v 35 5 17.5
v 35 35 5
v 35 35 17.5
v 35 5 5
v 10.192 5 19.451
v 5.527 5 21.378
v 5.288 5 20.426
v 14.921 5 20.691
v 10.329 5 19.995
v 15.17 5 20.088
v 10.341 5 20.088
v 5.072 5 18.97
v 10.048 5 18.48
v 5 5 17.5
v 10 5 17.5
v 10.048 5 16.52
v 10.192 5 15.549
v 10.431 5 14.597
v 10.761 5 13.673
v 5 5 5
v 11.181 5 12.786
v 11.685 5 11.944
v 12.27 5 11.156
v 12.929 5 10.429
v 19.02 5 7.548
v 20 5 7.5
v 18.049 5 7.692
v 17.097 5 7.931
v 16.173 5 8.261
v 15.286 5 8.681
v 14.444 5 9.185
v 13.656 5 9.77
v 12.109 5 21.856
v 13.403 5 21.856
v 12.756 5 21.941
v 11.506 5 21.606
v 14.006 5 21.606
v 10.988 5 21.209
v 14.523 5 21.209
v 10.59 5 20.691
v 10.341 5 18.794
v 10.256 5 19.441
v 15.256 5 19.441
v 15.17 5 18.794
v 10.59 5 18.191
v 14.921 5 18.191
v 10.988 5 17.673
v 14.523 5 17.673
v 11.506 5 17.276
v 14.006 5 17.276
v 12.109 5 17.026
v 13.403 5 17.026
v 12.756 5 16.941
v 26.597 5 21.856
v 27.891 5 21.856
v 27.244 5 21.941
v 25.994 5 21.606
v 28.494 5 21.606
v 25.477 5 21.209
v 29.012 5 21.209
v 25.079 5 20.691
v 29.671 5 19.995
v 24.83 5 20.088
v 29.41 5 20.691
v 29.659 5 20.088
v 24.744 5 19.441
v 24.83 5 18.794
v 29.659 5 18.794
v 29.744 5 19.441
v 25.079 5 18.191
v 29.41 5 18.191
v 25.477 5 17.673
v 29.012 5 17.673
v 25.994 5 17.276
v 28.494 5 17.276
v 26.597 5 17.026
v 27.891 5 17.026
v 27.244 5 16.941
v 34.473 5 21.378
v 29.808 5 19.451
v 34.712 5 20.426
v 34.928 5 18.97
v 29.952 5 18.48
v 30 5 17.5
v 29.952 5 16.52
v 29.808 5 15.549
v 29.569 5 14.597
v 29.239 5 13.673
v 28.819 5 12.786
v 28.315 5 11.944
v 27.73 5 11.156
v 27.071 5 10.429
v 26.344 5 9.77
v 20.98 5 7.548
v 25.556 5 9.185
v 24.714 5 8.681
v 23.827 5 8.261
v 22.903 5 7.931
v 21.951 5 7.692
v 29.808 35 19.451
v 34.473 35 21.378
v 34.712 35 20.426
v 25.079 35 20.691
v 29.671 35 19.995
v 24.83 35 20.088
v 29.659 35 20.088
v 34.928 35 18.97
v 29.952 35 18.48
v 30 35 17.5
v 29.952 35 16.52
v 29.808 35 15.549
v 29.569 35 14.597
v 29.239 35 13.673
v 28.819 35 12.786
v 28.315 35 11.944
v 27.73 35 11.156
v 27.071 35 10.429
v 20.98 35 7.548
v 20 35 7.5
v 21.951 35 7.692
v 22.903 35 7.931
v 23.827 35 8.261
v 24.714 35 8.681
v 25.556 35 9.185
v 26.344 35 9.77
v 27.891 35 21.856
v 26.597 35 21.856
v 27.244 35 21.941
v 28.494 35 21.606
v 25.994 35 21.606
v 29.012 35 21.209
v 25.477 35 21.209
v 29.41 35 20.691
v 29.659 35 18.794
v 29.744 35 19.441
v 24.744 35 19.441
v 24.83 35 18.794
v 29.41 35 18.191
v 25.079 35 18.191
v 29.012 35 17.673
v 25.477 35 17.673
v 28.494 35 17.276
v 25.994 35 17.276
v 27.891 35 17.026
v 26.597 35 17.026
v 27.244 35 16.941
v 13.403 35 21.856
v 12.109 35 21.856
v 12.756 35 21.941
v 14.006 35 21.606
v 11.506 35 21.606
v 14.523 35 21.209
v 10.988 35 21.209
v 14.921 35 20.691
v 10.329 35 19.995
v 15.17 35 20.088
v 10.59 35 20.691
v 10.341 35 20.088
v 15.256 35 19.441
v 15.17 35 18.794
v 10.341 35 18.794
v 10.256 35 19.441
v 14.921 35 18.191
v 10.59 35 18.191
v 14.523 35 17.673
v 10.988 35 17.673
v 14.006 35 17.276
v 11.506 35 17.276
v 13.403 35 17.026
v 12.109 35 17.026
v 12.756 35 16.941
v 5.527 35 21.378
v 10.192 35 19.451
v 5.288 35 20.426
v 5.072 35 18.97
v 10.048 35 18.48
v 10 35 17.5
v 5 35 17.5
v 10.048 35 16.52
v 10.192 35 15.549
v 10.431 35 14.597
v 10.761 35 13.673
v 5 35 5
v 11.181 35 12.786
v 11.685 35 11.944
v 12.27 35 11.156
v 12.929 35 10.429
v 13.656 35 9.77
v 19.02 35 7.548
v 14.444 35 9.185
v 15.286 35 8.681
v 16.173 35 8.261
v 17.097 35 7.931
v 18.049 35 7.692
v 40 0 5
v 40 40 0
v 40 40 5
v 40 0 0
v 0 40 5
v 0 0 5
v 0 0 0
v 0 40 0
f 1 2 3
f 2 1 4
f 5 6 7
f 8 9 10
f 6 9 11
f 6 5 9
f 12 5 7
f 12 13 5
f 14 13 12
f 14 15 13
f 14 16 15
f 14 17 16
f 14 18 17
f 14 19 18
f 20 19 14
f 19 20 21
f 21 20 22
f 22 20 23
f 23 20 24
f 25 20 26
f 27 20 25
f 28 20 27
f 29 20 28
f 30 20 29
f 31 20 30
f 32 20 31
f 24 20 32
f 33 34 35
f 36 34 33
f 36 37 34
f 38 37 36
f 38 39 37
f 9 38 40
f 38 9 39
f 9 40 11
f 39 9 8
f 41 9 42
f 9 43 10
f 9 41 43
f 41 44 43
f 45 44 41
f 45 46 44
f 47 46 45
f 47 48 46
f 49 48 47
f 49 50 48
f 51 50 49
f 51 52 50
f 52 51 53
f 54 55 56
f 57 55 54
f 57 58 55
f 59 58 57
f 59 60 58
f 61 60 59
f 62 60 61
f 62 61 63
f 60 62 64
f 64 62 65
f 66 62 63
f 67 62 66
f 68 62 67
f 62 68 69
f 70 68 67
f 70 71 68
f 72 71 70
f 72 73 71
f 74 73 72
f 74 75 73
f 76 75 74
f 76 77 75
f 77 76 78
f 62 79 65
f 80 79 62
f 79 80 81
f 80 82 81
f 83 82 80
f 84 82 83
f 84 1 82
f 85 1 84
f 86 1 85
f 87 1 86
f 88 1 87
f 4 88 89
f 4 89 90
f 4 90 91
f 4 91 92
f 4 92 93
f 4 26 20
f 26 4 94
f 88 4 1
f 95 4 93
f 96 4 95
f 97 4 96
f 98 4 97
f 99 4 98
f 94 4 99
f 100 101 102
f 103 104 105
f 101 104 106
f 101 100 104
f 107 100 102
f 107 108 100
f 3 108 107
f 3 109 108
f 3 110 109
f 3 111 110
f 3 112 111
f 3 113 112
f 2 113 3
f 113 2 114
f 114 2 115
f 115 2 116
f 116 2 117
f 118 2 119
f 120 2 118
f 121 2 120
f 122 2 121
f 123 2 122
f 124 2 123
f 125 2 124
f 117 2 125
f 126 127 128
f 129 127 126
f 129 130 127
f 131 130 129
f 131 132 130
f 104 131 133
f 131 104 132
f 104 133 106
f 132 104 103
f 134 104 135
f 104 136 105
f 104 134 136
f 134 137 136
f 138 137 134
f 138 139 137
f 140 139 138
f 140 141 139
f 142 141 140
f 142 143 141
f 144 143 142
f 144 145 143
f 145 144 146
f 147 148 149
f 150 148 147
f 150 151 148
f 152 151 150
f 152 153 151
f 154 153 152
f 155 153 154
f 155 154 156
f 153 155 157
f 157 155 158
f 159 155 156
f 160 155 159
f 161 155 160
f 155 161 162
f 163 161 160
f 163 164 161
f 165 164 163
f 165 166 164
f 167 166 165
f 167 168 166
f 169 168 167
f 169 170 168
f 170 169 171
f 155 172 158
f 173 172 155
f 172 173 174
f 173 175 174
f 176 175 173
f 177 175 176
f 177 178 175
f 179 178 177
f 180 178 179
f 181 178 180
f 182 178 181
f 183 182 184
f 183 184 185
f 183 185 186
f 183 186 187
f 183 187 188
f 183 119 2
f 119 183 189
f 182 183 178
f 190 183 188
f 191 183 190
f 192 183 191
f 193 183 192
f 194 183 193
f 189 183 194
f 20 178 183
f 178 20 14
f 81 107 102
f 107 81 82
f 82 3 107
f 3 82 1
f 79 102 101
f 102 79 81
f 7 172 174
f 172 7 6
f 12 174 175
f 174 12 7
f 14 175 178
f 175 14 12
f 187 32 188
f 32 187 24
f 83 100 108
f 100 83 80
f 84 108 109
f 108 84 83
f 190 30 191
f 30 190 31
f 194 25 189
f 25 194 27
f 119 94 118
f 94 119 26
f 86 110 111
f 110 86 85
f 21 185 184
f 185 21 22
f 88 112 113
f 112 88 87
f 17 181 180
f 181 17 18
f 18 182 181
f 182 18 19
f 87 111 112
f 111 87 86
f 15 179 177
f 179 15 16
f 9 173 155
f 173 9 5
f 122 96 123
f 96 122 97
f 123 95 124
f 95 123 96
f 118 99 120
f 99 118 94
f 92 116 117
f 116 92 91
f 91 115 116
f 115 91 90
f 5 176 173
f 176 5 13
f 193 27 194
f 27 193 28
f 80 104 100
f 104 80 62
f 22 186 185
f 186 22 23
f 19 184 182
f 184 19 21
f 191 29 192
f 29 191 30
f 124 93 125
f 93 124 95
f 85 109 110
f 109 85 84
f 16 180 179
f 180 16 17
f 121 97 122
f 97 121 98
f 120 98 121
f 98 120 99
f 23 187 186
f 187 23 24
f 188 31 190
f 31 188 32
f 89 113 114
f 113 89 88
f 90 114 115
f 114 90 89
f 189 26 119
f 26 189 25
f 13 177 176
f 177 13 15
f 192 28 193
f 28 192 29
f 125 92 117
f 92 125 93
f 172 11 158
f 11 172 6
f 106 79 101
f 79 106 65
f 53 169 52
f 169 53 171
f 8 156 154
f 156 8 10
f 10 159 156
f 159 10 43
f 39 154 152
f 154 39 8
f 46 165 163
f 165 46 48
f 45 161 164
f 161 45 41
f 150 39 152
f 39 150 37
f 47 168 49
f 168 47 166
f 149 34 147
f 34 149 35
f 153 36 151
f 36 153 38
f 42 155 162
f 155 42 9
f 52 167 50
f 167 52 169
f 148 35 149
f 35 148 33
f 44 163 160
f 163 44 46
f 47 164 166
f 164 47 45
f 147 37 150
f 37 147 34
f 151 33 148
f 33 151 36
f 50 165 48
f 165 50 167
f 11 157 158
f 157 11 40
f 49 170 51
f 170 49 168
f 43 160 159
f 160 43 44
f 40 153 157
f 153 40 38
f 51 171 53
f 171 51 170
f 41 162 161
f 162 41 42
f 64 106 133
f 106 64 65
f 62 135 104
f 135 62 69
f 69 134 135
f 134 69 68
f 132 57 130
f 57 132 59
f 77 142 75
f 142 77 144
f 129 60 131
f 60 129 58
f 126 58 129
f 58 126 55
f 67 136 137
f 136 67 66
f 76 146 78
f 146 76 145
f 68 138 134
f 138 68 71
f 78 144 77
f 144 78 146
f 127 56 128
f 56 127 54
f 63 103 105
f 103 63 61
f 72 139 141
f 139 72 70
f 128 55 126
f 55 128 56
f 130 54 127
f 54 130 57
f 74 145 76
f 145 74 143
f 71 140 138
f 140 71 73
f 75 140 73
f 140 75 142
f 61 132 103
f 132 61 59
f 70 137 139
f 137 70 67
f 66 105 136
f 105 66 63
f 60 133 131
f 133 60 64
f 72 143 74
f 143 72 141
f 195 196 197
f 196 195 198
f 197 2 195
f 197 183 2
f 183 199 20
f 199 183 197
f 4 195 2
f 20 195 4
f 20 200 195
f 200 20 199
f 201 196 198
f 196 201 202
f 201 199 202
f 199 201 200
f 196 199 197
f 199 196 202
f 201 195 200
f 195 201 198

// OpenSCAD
// Generated by SolidPython 1.1.3 on 2025-06-22 17:41:13
$fn = 64;


union() {
	cube(size = [40, 40, 5]);
	translate(v = [0, 0, 17.5000000000]) {
		translate(v = [20.0000000000, 35.0000000000, 0]) {
			rotate(a = [90, 0, 0]) {
				union() {
					difference() {
						union() {
							translate(v = [-15, -15, 0]) {
								cube(size = [30, 15.0000000000, 30]);
							}
							cylinder(h = 30, r = 15.0000000000);
						}
						translate(v = [0, 0, -0.1000000000]) {
							cylinder(h = 30.2000000000, r = 10);
						}
						translate(v = [0, 0, -0.1000000000]) {
							linear_extrude(height = 30.2000000000) {
								polygon(points = [[0, 0], [96.59258262890683, 25.881904510252074], [-96.59258262890683, 25.881904510252102], [0, 0]]);
							}
						}
					}
					union() {
						translate(v = [-7.244443697168012, 1.9411428382689075, 0]) {
							cylinder($fn = 24, h = 30, r = 2.5000000000);
						}
						translate(v = [7.244443697168012, 1.9411428382689075, 0]) {
							cylinder($fn = 24, h = 30, r = 2.5000000000);
						}
					}
				}
			}
		}
	}
}
/***********************************************
*********      SolidPython code:      **********
************************************************
 
import numpy as np
from solid import *
from solid.utils import *
import os

folder = os.path.basename(os.path.dirname(__file__))

z = 0.1
z2 = 0.2
m = 2

t = translate
tx = lambda e, x: t([x, 0, 0])(e)
ty = lambda e, x: t([0, x, 0])(e)
tz = lambda e, x: t([0, 0, x])(e)
txy = lambda e, x, y: t([x, y, 0])(e)

r = rotate
rx = lambda e, x: r([x, 0, 0])(e)
ry = lambda e, x: r([0, x, 0])(e)
rz = lambda e, x: r([0, 0, x])(e)

sc = lambda e, x: scale([x, x, x])(e)
sx = lambda e, x: scale([x, 1, 1])(e)
sy = lambda e, x: scale([1, x, 1])(e)
sxy = lambda e, x: scale([x, x, 1])(e)
sz = lambda e, x: scale([1, 1, x])(e)

cos = np.cos
sin = np.sin
pi = np.pi
save = lambda m, n: scad_render_to_file(m, n, file_header="$fn = 64;")


# Parameters
w_fan = 140 + m  # Width of fan
h_fan = 140 + m  # Height of fan
d_fan = 24 + m  # Depth of fan
r_fan = 134 / 2  # Radius
ox_fan_hole = 7 + m  # Offset x of fan screw hole
oy_fan_hole = 7 + m  # Offset y of fan screw hole
r_fan_hole = 2.5  # Radius of fan screw hole
re_fan_hole = 13  # Extra radius of fan screw hole
d_fan_hole = 5  # Depth of fan screw hole

x_ihose = 0.15 * w_fan  # Offset x of hose input connector
y_ihose = 0.50 * h_fan  # Offset y of hose input connector
x_ohose = 0.25 * w_fan  # Offset x of hose output connector
y_ohose = 0.40 * w_fan / 2  # Offset y of hose output connector
r_hose = 13  # Radius of hose connector
m_hose = 3  # Margin of hose connector
d_hose = 30  # Depth of hose connector

h_adapter = 2  # Height of adapter
w_adapter = 120  # Width of adapter attachment
d_adapter = 3  # Depth of adapter attachment
wd_adapter = 3  # Wall depth of adapter attachment

w_wall_mount = (r_hose - m_hose) * 2 + 5 * 4  # Width of wall mount
h_wall_mount = w_wall_mount  # Height of wall mount


def create_fan_box():
    d = w_fan / 2 - d_fan / 2
    fan_box = cube([w_fan, h_fan, d])
    fan = sphere(r=r_fan)
    fan = txy(fan, w_fan / 2, h_fan / 2)
    fan = tz(fan, -d_fan / 2)

    hole = cylinder(r=re_fan_hole, h=d + z2)
    hole = tz(hole, d_fan_hole)
    hole += cylinder(r=r_fan_hole, h=d + z2)
    ox, oy = ox_fan_hole, oy_fan_hole
    holes = txy(hole, ox, oy)
    holes += txy(hole, w_fan - ox, oy)
    holes += txy(hole, ox, h_fan - oy)
    holes += txy(hole, w_fan - ox, h_fan - oy)
    holes = tz(holes, -z)

    return fan_box - fan - holes


def create_fan_box_input():
    fan_box = create_fan_box()

    d = w_fan / 2 - d_fan / 2
    hose_input = cylinder(r=r_hose, h=d_hose)
    hose_input = txy(hose_input, x_ihose, y_ihose)
    hose_input = tz(hose_input, d)
    hose_input_hole = cylinder(r=r_hose - m_hose, h=d + d_hose + z2)
    hose_input_hole = txy(hose_input_hole, x_ihose, y_ihose)
    hose_input_hole = tz(hose_input_hole, -z)

    return fan_box + hose_input - hose_input_hole


def create_fan_box_output():
    fan_box = create_fan_box()

    d = w_fan / 2 - d_fan / 2
    hose_output = cylinder(r=r_hose, h=d_hose)
    hose_output = rx(hose_output, 90)
    hose_output = tx(hose_output, x_ohose)
    hose_output = tz(hose_output, y_ohose)
    hose_output_hole = cylinder(r=r_hose - m_hose, h=h_fan + d_hose + z2)
    hose_output_hole = rx(hose_output_hole, 90)
    hose_output_hole = txy(hose_output_hole, x_ohose, h_fan / 2)
    hose_output_hole = tz(hose_output_hole, y_ohose)

    return fan_box + hose_output - hose_output_hole


def create_litter_box_input_clamps():
    m = 6  # Margin

    clamp_hole = cube([m + z, m_hose + d_adapter + wd_adapter, h_adapter + z2])
    clamp_hole = txy(clamp_hole, -m - z, m)
    clamp_hole = tz(clamp_hole, -z)

    input_clamp = cube([m * 2.5, m_hose + d_adapter + wd_adapter + m * 2, h_adapter])
    input_clamp = tx(input_clamp, -m)
    input_clamp -= clamp_hole
    input_clamp = ty(input_clamp, -m_hose - wd_adapter)

    input_clamps = input_clamp + tz(tx(ry(input_clamp, 180), m * 4), h_adapter)

    return input_clamps


def create_litter_box_hose_input():
    m = 5  # Margin

    # The input hole for the air flow
    airflow_hole = cube(
        [w_adapter, d_adapter + wd_adapter + m * 3 + z2, h_adapter + z2]
    )
    airflow_hole = ty(airflow_hole, -m - z)
    airflow_hole = tz(airflow_hole, -z)

    # Shape of the rounded cat litter box
    r = 1000  # Radius of cat litter box
    indent = 2  # Indent of the cat litter box
    litter_box_shape = cylinder(r=r, h=r_hose * 2, segments=512 * r / 1000)
    litter_box_shape = txy(litter_box_shape, w_adapter / 2, r - indent)
    litter_box_shape = tz(litter_box_shape, -r_hose)

    # Hose input connector
    l_hose = w_adapter + m * 2 + d_hose
    hose_input = cylinder(r=r_hose, h=l_hose)
    hose_input += sphere(r=r_hose) - sphere(r=r_hose - m_hose)
    hose_input -= tz(cylinder(r=r_hose - m_hose, h=l_hose + z2), -z)
    hose_input = ry(hose_input, 90)
    hose_input = tz(hose_input, h_adapter / 2)
    hose_input = txy(hose_input, -m * 2, -r_hose)
    hose_input -= litter_box_shape
    hose_input -= airflow_hole
    hose_input = rx(hose_input, 90)
    hose_input = tz(hose_input, r_hose * 2)

    return hose_input


def get_pos_from_angle(angle, radius, offset_angle=0):
    """
    Get the x, y position from an angle and radius.
    :param angle: Angle in degrees.
    :param radius: Radius of the circle.
    :return: Tuple of (x, y) position.
    """
    angle_rad = np.deg2rad(angle + offset_angle)
    x = radius * cos(angle_rad)
    y = radius * sin(angle_rad)
    return x, y


def create_cake_slice(radius, angle_start, angle_end, height, offset_angle=0):
    """
    Create a cake slice shape from a circle.
    :param radius: Radius of the circle.
    :param angle_start: Start angle in degrees.
    :param angle_end: End angle in degrees.
    :param height: Height of the cake slice.
    :return: Cake slice shape.
    """
    x_start, y_start = get_pos_from_angle(angle_start, radius, offset_angle)
    x_end, y_end = get_pos_from_angle(angle_end, radius, offset_angle)

    points = [[0, 0], [x_start, y_start], [x_end, y_end], [0, 0]]

    return linear_extrude(height)(polygon(points))


def create_hose_wall_mount():
    m = 5  # Margin
    hd = h_wall_mount - m * 2  # Hose depth
    r = r_hose - m_hose  # Radius of the hose
    ro = r + m  # Outer radius of the hose

    # The wall mount for the hose
    wall_mount = cube([w_wall_mount, h_wall_mount, m])

    # The hose input connector
    w = ro * 2
    hose_input = cube([w, w / 2, hd])
    hose_input = txy(hose_input, -r - m, -r - m)
    hose_input += cylinder(r=w / 2, h=hd)
    hose_input -= tz(cylinder(r=r, h=hd + z2), -z)

    deg = 75  # Angle of the cake slice
    cake_slice = create_cake_slice(
        radius=100,
        angle_start=-deg,
        angle_end=deg,
        height=hd + z2,
        offset_angle=90,
    )
    cake_slice = tz(cake_slice, -z)
    hose_input -= cake_slice

    rounded_corner = cylinder(r=m / 2, h=hd, segments=24)
    x1, y1 = get_pos_from_angle(deg, ro / 2, offset_angle=90)
    rounded_corners = txy(rounded_corner, x1, y1) + txy(rounded_corner, -x1, y1)
    hose_input += rounded_corners

    hose_input = rx(hose_input, 90)
    hose_input = txy(hose_input, w_wall_mount / 2, h_wall_mount / 2 + hd / 2)
    hose_input = tz(hose_input, ro + m / 2)

    return wall_mount + hose_input


def create_hose_corner_mount(deg=0, fill_corner=False, round_edge=False):
    m = 5  # Margin
    r = r_hose - m_hose  # Radius of the hose
    ro = r + m  # Outer radius of the hose
    length = d_hose

    outer_shape = rz(
        circle(r=ro) + txy(square([ro, ro * 2]), -r - m, -r - m),
        deg,
    )

    inner_shape = rz(
        circle(r=r),
        deg,
    )

    bend_shell = rotate_extrude(angle=90)(tx(outer_shape, ro))
    bend_hole = rotate_extrude(angle=90)(tx(inner_shape, ro))
    bend = bend_shell - bend_hole

    outer_edge = linear_extrude(height=length)(outer_shape)
    inner_edge = linear_extrude(height=length + z2)(inner_shape)

    edge_a_shell = rx(outer_edge, 90)
    edge_a_shell = tx(edge_a_shell, ro)

    edge_a_hole = rx(inner_edge, 90)
    edge_a_hole = tx(edge_a_hole, ro)
    edge_a_hole = ty(edge_a_hole, z)

    edge_b_shell = outer_edge
    edge_b_shell = sy(edge_b_shell, -1)
    edge_b_shell = rz(edge_b_shell, 90)
    edge_b_shell = ry(edge_b_shell, -90)
    edge_b_shell = ty(edge_b_shell, ro)

    edge_b_hole = inner_edge
    edge_b_hole = sy(edge_b_hole, -1)
    edge_b_hole = rz(edge_b_hole, 90)
    edge_b_hole = ry(edge_b_hole, -90)
    edge_b_hole = ty(edge_b_hole, ro)
    edge_b_hole = tx(edge_b_hole, z)

    if fill_corner:
        corner_fill = cube([ro * 2, ro * 2, ro * 2])
        corner_fill -= tz(txy(cube([ro, ro, ro * 2 + z2]), -z, -z), -z)
        corner_fill = tz(corner_fill, -r - m)
        bend += corner_fill

        if not round_edge:
            round_corner = cube([m + z, m + z, ro * 2 + z2])
            round_corner -= cylinder(r=m, h=ro * 2 + z2)
            round_corner = tz(round_corner, -r - m - z)
            round_corner = txy(round_corner, ro * 2 - m, ro * 2 - m)
            bend -= round_corner

    if round_edge:
        round_edge_hole = cube([ro * 2 + length + z2, ro + z, ro * 2 + z2])
        round_edge_hole = tz(round_edge_hole, -r - m - z)
        round_edge_hole -= ry(cylinder(r=ro, h=ro * 2 + length + z2), 90)
        round_edge_hole = tx(round_edge_hole, -length - z)
        round_edge_hole = ty(round_edge_hole, ro)
        bend -= round_edge_hole
        edge_b_shell -= round_edge_hole

    shell = bend + edge_a_shell + edge_b_shell
    hole = bend_hole + edge_a_hole + edge_b_hole

    return shell - hole


def create_hose_inner_corner_mount():
    return create_hose_corner_mount(deg=180, fill_corner=True)


def create_hose_outer_corner_mount():
    return create_hose_corner_mount(deg=0)


def create_hose_outward_corner_mount():
    return create_hose_corner_mount(deg=180, fill_corner=True, round_edge=True)


def create_hose_side_corner_mount():
    return create_hose_corner_mount(deg=90)


# Create the fan box input and output, and the assembly
fan_box_input = create_fan_box_input()
fan_box_output = create_fan_box_output()
assembly = rx(fan_box_input, 90) + ty(tz(rx(fan_box_output, -90), h_fan), d_fan)
save(fan_box_input, folder + ".fan-box-input.scad")
save(fan_box_output, folder + ".fan-box-output.scad")
save(assembly, folder + ".assembly.scad")

# Create the litter box hose input, and clamps for it
# The clamps are separate from the hose input because:
# 1. Removes need of supports for the hose input
# 2. Printing them flat makes them more durable
save(create_litter_box_hose_input(), folder + ".litter-box.hose-input.scad")
save(create_litter_box_input_clamps(), folder + ".litter-box.input-clamps.scad")

# Create the wall mount for the hose
save(create_hose_wall_mount(), folder + ".hose-wall-mount.scad")
save(create_hose_inner_corner_mount(), folder + ".hose-inner-corner-mount.scad")
save(create_hose_outer_corner_mount(), folder + ".hose-outer-corner-mount.scad")
save(create_hose_outward_corner_mount(), folder + ".hose-outward-corner-mount.scad")
save(create_hose_side_corner_mount(), folder + ".hose-side-corner-mount.scad")
 
 
************************************************/
